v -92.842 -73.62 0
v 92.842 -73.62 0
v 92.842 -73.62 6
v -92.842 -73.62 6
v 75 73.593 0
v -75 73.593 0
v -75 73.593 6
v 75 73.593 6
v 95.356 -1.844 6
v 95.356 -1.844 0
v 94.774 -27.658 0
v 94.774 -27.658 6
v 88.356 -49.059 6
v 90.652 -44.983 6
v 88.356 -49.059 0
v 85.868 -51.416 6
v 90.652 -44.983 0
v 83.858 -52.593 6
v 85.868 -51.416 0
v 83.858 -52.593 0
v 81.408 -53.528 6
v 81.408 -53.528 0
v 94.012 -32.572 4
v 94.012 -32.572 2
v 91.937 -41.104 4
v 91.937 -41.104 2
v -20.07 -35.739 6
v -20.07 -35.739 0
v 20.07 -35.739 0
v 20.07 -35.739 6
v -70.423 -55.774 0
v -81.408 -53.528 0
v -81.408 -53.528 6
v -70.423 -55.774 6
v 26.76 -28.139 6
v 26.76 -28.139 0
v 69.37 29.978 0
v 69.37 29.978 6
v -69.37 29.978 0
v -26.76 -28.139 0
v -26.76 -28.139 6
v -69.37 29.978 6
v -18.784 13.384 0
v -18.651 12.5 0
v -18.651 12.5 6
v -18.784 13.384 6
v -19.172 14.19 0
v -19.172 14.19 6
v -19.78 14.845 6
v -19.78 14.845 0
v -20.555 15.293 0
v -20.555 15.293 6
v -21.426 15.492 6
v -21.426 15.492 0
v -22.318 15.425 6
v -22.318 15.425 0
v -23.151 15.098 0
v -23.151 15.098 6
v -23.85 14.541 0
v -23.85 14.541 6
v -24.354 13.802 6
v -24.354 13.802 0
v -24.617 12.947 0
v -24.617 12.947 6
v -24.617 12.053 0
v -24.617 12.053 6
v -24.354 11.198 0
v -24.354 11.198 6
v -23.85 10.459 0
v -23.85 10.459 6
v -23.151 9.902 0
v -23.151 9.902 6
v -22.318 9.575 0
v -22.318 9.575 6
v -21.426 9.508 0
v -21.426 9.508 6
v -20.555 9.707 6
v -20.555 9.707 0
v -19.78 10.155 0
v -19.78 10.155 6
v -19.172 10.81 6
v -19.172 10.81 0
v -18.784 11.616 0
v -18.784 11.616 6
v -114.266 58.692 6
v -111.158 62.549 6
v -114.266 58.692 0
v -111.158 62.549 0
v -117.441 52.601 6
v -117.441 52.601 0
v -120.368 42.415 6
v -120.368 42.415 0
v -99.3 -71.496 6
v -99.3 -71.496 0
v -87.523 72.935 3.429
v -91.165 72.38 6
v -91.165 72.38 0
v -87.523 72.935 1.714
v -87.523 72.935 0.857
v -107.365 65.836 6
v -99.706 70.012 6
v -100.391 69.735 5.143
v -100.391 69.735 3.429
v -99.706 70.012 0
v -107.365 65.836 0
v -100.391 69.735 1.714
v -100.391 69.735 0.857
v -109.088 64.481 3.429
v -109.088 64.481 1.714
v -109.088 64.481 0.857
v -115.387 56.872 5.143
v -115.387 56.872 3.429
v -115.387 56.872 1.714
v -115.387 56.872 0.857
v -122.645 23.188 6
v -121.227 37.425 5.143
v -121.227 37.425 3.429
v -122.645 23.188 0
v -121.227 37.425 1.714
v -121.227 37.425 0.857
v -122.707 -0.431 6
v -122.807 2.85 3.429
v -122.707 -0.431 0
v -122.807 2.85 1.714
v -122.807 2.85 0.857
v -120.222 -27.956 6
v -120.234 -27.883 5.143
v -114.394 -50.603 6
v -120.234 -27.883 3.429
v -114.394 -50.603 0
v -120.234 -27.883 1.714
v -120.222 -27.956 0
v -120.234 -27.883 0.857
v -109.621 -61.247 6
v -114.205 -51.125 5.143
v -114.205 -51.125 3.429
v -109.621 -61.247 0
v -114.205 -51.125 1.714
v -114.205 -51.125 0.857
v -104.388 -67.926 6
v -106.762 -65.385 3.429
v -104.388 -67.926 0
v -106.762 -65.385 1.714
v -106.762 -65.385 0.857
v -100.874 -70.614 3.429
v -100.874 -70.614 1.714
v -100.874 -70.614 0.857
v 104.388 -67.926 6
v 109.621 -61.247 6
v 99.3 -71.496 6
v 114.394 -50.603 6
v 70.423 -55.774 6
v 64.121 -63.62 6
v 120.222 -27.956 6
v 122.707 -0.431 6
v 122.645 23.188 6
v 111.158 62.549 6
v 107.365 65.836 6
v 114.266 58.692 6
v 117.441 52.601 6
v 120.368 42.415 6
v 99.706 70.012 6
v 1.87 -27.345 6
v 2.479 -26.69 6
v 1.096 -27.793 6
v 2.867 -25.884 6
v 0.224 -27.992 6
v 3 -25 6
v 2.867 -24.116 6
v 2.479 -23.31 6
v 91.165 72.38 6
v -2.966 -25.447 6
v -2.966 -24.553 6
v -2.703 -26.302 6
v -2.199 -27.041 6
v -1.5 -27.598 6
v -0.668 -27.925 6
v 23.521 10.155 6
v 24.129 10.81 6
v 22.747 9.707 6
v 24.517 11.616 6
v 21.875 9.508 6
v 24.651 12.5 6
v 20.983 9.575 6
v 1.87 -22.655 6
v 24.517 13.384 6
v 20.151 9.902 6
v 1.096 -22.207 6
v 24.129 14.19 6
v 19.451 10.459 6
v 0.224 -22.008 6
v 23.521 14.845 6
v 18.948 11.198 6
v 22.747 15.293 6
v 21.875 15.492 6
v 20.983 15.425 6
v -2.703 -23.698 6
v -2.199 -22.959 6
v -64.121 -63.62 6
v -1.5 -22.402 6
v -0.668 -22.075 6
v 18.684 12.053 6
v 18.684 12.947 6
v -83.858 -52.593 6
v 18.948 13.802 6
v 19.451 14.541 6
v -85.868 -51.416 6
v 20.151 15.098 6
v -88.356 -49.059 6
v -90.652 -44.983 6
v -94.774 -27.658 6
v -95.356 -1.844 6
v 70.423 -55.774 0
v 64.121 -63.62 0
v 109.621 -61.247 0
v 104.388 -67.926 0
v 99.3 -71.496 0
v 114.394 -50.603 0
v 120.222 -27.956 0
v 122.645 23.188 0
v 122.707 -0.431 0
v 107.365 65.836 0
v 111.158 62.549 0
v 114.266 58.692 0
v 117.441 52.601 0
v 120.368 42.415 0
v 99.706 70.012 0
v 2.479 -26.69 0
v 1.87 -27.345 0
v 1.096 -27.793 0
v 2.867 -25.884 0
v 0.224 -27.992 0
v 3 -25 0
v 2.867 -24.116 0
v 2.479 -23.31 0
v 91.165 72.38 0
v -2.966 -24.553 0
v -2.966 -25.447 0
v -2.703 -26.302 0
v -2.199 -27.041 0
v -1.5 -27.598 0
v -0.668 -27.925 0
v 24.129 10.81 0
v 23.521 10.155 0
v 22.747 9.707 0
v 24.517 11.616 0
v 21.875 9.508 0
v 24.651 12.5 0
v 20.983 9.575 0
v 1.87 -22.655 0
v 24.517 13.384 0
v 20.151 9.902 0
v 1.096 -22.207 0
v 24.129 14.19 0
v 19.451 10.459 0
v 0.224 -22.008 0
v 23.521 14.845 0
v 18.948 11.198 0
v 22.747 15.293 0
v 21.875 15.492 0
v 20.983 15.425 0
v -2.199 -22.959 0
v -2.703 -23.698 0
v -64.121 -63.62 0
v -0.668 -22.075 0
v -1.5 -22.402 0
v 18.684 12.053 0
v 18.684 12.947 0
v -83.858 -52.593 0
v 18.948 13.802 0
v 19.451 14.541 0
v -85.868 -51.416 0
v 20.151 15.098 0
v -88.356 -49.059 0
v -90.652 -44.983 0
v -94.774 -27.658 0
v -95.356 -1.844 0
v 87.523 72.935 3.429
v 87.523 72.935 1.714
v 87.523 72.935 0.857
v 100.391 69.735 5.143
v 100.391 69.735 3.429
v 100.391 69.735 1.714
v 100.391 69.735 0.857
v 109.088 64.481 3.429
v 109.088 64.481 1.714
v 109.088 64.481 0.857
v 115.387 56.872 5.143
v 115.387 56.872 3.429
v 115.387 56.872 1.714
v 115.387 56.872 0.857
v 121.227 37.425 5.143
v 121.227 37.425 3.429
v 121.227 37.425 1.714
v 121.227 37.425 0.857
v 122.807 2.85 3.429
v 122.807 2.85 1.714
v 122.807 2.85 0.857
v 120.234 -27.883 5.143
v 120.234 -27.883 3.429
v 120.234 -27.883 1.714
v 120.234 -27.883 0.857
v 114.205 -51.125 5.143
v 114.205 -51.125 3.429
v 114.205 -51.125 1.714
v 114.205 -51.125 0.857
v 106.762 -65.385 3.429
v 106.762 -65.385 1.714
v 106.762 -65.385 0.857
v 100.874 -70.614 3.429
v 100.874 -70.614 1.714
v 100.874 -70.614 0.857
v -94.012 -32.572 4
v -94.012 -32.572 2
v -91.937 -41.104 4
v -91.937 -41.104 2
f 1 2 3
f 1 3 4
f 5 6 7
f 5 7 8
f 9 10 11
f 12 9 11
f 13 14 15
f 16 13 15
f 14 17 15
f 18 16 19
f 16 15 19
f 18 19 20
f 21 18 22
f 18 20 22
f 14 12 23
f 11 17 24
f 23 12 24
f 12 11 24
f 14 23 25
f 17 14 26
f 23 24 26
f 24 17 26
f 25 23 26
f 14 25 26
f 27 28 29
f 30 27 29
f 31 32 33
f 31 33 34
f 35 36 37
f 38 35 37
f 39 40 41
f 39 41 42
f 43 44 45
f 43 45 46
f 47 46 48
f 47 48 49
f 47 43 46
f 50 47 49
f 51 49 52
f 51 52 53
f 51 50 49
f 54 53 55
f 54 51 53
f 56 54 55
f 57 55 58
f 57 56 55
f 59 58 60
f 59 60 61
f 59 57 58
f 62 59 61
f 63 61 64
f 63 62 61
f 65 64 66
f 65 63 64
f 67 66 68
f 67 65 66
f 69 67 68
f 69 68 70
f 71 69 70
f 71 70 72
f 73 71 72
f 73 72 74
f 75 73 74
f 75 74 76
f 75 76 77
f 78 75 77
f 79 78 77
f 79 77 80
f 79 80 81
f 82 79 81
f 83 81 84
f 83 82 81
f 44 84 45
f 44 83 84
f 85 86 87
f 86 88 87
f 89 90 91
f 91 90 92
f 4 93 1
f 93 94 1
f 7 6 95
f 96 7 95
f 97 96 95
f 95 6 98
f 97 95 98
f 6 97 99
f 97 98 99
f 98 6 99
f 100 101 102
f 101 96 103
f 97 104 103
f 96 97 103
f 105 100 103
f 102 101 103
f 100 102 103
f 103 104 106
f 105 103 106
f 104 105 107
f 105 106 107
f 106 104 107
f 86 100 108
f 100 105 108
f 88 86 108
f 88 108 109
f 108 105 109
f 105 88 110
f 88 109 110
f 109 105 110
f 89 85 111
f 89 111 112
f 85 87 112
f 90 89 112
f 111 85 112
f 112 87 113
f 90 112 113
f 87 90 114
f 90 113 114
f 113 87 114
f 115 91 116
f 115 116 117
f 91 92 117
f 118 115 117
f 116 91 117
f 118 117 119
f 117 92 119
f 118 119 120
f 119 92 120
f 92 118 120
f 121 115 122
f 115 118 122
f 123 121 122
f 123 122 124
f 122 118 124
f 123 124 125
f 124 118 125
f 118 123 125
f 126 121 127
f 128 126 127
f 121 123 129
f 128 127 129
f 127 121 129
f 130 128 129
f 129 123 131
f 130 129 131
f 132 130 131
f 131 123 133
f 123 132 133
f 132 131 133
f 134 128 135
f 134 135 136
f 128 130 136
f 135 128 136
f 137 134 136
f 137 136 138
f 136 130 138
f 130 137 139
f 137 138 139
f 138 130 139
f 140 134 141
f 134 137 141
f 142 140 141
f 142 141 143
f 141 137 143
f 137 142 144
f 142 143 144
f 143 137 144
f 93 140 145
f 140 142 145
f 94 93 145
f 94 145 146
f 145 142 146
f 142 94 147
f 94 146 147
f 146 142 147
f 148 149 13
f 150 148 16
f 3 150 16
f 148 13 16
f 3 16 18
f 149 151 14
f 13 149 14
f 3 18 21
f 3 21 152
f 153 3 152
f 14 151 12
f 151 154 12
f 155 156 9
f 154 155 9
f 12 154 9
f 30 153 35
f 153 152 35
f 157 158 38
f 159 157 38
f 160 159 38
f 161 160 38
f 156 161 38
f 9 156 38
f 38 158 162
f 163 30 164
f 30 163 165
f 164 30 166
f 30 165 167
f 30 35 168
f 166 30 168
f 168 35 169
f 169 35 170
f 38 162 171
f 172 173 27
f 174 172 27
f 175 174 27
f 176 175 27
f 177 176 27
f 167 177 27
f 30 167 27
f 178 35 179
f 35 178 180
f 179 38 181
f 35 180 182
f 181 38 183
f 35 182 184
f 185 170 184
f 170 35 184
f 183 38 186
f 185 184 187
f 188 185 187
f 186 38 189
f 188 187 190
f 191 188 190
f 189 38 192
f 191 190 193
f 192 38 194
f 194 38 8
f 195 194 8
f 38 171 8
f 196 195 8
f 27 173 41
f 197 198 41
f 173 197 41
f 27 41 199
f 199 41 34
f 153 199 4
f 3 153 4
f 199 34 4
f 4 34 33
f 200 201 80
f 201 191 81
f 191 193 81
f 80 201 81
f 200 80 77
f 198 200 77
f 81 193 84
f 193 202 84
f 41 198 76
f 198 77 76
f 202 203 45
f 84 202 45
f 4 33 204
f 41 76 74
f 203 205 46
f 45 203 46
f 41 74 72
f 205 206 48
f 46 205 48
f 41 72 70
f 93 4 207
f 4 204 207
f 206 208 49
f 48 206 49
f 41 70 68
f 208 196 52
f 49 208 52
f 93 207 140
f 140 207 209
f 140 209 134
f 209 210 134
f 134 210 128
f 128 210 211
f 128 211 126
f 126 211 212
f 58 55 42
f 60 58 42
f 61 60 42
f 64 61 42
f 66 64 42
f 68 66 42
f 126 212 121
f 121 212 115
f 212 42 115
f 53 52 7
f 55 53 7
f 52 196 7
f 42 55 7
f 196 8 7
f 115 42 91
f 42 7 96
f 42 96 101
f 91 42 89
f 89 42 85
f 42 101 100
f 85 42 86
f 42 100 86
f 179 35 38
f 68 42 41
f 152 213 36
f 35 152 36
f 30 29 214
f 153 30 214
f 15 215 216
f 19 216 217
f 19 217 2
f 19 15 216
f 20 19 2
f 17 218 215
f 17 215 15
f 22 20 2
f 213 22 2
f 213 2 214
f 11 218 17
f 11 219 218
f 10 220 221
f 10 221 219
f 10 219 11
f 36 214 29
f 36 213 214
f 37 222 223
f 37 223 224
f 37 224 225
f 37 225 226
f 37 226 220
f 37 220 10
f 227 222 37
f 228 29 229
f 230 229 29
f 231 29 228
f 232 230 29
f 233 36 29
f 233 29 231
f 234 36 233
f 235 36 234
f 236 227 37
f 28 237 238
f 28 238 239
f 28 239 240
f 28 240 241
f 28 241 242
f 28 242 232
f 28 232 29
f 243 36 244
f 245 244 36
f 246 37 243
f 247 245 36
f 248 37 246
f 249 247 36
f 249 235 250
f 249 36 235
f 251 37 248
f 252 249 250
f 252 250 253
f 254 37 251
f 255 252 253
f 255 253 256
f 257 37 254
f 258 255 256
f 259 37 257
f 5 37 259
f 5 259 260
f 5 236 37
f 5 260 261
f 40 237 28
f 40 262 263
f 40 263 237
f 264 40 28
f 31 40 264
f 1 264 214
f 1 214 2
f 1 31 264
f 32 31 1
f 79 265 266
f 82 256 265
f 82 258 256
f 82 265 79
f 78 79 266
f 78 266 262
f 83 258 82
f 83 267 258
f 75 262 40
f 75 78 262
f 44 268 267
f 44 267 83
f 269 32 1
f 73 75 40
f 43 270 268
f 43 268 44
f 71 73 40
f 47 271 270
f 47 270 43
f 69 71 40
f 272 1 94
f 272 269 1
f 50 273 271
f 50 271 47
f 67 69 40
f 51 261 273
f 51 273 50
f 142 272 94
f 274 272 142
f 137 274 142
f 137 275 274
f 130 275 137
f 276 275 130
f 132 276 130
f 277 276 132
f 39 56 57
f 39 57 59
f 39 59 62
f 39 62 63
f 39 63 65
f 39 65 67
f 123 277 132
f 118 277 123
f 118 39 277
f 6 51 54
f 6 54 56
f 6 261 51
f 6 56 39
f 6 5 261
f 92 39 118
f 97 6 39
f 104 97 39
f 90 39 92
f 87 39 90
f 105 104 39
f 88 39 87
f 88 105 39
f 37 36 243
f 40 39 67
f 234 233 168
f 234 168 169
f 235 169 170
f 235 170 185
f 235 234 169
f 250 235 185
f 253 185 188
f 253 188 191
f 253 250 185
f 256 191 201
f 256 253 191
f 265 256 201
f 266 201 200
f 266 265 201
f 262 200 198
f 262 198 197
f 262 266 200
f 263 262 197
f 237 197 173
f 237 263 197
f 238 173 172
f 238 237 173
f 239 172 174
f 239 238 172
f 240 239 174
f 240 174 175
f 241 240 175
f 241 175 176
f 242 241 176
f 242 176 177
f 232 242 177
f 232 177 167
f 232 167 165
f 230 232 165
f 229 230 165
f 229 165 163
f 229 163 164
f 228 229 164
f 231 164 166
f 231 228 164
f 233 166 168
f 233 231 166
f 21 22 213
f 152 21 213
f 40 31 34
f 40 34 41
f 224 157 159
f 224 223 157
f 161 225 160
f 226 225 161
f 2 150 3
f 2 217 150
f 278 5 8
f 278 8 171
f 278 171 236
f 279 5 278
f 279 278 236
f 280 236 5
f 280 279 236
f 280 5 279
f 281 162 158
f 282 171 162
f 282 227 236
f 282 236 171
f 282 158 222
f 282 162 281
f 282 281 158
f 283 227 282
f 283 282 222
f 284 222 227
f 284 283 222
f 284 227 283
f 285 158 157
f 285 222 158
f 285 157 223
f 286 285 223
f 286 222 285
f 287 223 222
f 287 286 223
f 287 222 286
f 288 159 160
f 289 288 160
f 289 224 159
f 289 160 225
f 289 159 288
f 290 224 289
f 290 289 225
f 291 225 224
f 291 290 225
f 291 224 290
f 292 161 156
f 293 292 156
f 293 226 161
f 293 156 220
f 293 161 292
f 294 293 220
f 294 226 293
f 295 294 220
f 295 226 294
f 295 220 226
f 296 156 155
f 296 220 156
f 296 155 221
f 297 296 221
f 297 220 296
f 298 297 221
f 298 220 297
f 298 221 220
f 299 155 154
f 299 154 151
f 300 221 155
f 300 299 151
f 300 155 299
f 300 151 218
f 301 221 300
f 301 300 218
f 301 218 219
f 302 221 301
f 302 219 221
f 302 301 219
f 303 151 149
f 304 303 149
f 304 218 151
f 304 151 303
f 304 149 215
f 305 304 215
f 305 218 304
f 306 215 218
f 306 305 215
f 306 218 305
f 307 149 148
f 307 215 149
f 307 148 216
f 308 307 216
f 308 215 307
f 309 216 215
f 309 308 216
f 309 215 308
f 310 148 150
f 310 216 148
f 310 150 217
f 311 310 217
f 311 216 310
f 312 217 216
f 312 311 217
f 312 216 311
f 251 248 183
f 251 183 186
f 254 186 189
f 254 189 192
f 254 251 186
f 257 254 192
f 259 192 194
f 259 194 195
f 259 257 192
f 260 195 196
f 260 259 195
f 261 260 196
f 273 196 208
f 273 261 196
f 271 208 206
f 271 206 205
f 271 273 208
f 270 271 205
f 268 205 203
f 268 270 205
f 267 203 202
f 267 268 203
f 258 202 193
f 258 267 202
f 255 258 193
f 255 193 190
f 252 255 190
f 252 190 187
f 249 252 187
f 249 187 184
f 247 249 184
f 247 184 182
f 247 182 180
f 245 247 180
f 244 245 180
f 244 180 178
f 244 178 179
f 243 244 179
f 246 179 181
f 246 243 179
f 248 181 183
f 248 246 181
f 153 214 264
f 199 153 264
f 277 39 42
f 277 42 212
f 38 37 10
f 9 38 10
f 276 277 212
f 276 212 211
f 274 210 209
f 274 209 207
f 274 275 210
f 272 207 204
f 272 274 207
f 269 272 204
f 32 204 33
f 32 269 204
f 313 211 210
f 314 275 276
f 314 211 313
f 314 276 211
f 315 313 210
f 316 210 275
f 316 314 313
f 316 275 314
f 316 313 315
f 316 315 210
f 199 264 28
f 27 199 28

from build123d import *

# Parameters (mm, degrees)
SKETCH1_R           = 3
BOSS_EXTRUDE1_DEPTH = 6


with BuildPart() as part:
    # Sketch1 → Boss-Extrude1 (new body)
    with BuildSketch(Plane.XY):
        with BuildLine():
            Line((92.841871249, -73.620070941), (-92.841871249, -73.620070941))
            add(Edge.make_bspline(
                [(-75, 73.592558307), (-82.684370337, 73.592558307), (-97.854658076, 72.84953562), (-116.58129419, 59.781757802), (-122.878964083, 33.919509961), (-123.235734842, 4.232494838), (-121.42217592, -25.830232168), (-114.384033914, -53.876688185), (-105.21357221, -71.413623273), (-92.841871249, -73.620070941)],
                knots=[0, 0, 0, 0, 0.136998407, 0.217327042, 0.350867913, 0.535494521, 0.700007308, 0.828084137, 1, 1, 1, 1], degree=3))
            Line((-75, 73.592558307), (75, 73.592558307))
            add(Edge.make_bspline(
                [(75, 73.592558307), (82.684370337, 73.592558307), (97.854658076, 72.84953562), (116.58129419, 59.781757802), (122.878964083, 33.919509961), (123.235734842, 4.232494838), (121.42217592, -25.830232168), (114.384033914, -53.876688185), (105.21357221, -71.413623273), (92.841871249, -73.620070941)],
                knots=[0, 0, 0, 0, 0.136998407, 0.217327042, 0.350867913, 0.535494521, 0.700007308, 0.828084137, 1, 1, 1, 1], degree=3))
        make_face()
        with Locations((-21.650635095, 12.5)):
            Circle(SKETCH1_R, mode=Mode.SUBTRACT)
        with Locations((21.650635095, 12.5)):
            Circle(SKETCH1_R, mode=Mode.SUBTRACT)
        with Locations((0, -25)):
            Circle(SKETCH1_R, mode=Mode.SUBTRACT)
        with BuildLine():
            Line((69.370032777, 29.977750595), (95.356248747, -1.843539004))
            add(Edge.make_bspline(
                [(95.356248747, -1.843539004), (95.671527316, -16.555540014), (95.495129896, -27.347253955), (91.456528801, -43.448489839), (88.616577504, -51.376366499), (81.407786651, -53.527589513)],
                knots=[0, 0, 0, 0, 0.501052944, 0.6781501, 1, 1, 1, 1], degree=3))
            Line((81.407786651, -53.527589513), (70.423019625, -55.77404363))
            Line((70.423019625, -55.77404363), (26.760379335, -28.138662852))
            Line((26.760379335, -28.138662852), (69.370032777, 29.977750595))
        make_face(mode=Mode.SUBTRACT)
        Polygon((-20.070368486, -35.739051104), (20.070368486, -35.739051104), (64.121107278, -63.620070941), (-64.121107278, -63.620070941), align=None, mode=Mode.SUBTRACT)
        with BuildLine():
            Line((-69.370032777, 29.977750595), (-95.356248747, -1.843539004))
            add(Edge.make_bspline(
                [(-95.356248747, -1.843539004), (-95.671527316, -16.555540014), (-95.495129896, -27.347253955), (-91.456528801, -43.448489839), (-88.616577504, -51.376366499), (-81.407786651, -53.527589513)],
                knots=[0, 0, 0, 0, 0.501052944, 0.6781501, 1, 1, 1, 1], degree=3))
            Line((-81.407786651, -53.527589513), (-70.423019625, -55.77404363))
            Line((-70.423019625, -55.77404363), (-26.760379335, -28.138662852))
            Line((-26.760379335, -28.138662852), (-69.370032777, 29.977750595))
        make_face(mode=Mode.SUBTRACT)
    extrude(amount=BOSS_EXTRUDE1_DEPTH)


solid = part.part
